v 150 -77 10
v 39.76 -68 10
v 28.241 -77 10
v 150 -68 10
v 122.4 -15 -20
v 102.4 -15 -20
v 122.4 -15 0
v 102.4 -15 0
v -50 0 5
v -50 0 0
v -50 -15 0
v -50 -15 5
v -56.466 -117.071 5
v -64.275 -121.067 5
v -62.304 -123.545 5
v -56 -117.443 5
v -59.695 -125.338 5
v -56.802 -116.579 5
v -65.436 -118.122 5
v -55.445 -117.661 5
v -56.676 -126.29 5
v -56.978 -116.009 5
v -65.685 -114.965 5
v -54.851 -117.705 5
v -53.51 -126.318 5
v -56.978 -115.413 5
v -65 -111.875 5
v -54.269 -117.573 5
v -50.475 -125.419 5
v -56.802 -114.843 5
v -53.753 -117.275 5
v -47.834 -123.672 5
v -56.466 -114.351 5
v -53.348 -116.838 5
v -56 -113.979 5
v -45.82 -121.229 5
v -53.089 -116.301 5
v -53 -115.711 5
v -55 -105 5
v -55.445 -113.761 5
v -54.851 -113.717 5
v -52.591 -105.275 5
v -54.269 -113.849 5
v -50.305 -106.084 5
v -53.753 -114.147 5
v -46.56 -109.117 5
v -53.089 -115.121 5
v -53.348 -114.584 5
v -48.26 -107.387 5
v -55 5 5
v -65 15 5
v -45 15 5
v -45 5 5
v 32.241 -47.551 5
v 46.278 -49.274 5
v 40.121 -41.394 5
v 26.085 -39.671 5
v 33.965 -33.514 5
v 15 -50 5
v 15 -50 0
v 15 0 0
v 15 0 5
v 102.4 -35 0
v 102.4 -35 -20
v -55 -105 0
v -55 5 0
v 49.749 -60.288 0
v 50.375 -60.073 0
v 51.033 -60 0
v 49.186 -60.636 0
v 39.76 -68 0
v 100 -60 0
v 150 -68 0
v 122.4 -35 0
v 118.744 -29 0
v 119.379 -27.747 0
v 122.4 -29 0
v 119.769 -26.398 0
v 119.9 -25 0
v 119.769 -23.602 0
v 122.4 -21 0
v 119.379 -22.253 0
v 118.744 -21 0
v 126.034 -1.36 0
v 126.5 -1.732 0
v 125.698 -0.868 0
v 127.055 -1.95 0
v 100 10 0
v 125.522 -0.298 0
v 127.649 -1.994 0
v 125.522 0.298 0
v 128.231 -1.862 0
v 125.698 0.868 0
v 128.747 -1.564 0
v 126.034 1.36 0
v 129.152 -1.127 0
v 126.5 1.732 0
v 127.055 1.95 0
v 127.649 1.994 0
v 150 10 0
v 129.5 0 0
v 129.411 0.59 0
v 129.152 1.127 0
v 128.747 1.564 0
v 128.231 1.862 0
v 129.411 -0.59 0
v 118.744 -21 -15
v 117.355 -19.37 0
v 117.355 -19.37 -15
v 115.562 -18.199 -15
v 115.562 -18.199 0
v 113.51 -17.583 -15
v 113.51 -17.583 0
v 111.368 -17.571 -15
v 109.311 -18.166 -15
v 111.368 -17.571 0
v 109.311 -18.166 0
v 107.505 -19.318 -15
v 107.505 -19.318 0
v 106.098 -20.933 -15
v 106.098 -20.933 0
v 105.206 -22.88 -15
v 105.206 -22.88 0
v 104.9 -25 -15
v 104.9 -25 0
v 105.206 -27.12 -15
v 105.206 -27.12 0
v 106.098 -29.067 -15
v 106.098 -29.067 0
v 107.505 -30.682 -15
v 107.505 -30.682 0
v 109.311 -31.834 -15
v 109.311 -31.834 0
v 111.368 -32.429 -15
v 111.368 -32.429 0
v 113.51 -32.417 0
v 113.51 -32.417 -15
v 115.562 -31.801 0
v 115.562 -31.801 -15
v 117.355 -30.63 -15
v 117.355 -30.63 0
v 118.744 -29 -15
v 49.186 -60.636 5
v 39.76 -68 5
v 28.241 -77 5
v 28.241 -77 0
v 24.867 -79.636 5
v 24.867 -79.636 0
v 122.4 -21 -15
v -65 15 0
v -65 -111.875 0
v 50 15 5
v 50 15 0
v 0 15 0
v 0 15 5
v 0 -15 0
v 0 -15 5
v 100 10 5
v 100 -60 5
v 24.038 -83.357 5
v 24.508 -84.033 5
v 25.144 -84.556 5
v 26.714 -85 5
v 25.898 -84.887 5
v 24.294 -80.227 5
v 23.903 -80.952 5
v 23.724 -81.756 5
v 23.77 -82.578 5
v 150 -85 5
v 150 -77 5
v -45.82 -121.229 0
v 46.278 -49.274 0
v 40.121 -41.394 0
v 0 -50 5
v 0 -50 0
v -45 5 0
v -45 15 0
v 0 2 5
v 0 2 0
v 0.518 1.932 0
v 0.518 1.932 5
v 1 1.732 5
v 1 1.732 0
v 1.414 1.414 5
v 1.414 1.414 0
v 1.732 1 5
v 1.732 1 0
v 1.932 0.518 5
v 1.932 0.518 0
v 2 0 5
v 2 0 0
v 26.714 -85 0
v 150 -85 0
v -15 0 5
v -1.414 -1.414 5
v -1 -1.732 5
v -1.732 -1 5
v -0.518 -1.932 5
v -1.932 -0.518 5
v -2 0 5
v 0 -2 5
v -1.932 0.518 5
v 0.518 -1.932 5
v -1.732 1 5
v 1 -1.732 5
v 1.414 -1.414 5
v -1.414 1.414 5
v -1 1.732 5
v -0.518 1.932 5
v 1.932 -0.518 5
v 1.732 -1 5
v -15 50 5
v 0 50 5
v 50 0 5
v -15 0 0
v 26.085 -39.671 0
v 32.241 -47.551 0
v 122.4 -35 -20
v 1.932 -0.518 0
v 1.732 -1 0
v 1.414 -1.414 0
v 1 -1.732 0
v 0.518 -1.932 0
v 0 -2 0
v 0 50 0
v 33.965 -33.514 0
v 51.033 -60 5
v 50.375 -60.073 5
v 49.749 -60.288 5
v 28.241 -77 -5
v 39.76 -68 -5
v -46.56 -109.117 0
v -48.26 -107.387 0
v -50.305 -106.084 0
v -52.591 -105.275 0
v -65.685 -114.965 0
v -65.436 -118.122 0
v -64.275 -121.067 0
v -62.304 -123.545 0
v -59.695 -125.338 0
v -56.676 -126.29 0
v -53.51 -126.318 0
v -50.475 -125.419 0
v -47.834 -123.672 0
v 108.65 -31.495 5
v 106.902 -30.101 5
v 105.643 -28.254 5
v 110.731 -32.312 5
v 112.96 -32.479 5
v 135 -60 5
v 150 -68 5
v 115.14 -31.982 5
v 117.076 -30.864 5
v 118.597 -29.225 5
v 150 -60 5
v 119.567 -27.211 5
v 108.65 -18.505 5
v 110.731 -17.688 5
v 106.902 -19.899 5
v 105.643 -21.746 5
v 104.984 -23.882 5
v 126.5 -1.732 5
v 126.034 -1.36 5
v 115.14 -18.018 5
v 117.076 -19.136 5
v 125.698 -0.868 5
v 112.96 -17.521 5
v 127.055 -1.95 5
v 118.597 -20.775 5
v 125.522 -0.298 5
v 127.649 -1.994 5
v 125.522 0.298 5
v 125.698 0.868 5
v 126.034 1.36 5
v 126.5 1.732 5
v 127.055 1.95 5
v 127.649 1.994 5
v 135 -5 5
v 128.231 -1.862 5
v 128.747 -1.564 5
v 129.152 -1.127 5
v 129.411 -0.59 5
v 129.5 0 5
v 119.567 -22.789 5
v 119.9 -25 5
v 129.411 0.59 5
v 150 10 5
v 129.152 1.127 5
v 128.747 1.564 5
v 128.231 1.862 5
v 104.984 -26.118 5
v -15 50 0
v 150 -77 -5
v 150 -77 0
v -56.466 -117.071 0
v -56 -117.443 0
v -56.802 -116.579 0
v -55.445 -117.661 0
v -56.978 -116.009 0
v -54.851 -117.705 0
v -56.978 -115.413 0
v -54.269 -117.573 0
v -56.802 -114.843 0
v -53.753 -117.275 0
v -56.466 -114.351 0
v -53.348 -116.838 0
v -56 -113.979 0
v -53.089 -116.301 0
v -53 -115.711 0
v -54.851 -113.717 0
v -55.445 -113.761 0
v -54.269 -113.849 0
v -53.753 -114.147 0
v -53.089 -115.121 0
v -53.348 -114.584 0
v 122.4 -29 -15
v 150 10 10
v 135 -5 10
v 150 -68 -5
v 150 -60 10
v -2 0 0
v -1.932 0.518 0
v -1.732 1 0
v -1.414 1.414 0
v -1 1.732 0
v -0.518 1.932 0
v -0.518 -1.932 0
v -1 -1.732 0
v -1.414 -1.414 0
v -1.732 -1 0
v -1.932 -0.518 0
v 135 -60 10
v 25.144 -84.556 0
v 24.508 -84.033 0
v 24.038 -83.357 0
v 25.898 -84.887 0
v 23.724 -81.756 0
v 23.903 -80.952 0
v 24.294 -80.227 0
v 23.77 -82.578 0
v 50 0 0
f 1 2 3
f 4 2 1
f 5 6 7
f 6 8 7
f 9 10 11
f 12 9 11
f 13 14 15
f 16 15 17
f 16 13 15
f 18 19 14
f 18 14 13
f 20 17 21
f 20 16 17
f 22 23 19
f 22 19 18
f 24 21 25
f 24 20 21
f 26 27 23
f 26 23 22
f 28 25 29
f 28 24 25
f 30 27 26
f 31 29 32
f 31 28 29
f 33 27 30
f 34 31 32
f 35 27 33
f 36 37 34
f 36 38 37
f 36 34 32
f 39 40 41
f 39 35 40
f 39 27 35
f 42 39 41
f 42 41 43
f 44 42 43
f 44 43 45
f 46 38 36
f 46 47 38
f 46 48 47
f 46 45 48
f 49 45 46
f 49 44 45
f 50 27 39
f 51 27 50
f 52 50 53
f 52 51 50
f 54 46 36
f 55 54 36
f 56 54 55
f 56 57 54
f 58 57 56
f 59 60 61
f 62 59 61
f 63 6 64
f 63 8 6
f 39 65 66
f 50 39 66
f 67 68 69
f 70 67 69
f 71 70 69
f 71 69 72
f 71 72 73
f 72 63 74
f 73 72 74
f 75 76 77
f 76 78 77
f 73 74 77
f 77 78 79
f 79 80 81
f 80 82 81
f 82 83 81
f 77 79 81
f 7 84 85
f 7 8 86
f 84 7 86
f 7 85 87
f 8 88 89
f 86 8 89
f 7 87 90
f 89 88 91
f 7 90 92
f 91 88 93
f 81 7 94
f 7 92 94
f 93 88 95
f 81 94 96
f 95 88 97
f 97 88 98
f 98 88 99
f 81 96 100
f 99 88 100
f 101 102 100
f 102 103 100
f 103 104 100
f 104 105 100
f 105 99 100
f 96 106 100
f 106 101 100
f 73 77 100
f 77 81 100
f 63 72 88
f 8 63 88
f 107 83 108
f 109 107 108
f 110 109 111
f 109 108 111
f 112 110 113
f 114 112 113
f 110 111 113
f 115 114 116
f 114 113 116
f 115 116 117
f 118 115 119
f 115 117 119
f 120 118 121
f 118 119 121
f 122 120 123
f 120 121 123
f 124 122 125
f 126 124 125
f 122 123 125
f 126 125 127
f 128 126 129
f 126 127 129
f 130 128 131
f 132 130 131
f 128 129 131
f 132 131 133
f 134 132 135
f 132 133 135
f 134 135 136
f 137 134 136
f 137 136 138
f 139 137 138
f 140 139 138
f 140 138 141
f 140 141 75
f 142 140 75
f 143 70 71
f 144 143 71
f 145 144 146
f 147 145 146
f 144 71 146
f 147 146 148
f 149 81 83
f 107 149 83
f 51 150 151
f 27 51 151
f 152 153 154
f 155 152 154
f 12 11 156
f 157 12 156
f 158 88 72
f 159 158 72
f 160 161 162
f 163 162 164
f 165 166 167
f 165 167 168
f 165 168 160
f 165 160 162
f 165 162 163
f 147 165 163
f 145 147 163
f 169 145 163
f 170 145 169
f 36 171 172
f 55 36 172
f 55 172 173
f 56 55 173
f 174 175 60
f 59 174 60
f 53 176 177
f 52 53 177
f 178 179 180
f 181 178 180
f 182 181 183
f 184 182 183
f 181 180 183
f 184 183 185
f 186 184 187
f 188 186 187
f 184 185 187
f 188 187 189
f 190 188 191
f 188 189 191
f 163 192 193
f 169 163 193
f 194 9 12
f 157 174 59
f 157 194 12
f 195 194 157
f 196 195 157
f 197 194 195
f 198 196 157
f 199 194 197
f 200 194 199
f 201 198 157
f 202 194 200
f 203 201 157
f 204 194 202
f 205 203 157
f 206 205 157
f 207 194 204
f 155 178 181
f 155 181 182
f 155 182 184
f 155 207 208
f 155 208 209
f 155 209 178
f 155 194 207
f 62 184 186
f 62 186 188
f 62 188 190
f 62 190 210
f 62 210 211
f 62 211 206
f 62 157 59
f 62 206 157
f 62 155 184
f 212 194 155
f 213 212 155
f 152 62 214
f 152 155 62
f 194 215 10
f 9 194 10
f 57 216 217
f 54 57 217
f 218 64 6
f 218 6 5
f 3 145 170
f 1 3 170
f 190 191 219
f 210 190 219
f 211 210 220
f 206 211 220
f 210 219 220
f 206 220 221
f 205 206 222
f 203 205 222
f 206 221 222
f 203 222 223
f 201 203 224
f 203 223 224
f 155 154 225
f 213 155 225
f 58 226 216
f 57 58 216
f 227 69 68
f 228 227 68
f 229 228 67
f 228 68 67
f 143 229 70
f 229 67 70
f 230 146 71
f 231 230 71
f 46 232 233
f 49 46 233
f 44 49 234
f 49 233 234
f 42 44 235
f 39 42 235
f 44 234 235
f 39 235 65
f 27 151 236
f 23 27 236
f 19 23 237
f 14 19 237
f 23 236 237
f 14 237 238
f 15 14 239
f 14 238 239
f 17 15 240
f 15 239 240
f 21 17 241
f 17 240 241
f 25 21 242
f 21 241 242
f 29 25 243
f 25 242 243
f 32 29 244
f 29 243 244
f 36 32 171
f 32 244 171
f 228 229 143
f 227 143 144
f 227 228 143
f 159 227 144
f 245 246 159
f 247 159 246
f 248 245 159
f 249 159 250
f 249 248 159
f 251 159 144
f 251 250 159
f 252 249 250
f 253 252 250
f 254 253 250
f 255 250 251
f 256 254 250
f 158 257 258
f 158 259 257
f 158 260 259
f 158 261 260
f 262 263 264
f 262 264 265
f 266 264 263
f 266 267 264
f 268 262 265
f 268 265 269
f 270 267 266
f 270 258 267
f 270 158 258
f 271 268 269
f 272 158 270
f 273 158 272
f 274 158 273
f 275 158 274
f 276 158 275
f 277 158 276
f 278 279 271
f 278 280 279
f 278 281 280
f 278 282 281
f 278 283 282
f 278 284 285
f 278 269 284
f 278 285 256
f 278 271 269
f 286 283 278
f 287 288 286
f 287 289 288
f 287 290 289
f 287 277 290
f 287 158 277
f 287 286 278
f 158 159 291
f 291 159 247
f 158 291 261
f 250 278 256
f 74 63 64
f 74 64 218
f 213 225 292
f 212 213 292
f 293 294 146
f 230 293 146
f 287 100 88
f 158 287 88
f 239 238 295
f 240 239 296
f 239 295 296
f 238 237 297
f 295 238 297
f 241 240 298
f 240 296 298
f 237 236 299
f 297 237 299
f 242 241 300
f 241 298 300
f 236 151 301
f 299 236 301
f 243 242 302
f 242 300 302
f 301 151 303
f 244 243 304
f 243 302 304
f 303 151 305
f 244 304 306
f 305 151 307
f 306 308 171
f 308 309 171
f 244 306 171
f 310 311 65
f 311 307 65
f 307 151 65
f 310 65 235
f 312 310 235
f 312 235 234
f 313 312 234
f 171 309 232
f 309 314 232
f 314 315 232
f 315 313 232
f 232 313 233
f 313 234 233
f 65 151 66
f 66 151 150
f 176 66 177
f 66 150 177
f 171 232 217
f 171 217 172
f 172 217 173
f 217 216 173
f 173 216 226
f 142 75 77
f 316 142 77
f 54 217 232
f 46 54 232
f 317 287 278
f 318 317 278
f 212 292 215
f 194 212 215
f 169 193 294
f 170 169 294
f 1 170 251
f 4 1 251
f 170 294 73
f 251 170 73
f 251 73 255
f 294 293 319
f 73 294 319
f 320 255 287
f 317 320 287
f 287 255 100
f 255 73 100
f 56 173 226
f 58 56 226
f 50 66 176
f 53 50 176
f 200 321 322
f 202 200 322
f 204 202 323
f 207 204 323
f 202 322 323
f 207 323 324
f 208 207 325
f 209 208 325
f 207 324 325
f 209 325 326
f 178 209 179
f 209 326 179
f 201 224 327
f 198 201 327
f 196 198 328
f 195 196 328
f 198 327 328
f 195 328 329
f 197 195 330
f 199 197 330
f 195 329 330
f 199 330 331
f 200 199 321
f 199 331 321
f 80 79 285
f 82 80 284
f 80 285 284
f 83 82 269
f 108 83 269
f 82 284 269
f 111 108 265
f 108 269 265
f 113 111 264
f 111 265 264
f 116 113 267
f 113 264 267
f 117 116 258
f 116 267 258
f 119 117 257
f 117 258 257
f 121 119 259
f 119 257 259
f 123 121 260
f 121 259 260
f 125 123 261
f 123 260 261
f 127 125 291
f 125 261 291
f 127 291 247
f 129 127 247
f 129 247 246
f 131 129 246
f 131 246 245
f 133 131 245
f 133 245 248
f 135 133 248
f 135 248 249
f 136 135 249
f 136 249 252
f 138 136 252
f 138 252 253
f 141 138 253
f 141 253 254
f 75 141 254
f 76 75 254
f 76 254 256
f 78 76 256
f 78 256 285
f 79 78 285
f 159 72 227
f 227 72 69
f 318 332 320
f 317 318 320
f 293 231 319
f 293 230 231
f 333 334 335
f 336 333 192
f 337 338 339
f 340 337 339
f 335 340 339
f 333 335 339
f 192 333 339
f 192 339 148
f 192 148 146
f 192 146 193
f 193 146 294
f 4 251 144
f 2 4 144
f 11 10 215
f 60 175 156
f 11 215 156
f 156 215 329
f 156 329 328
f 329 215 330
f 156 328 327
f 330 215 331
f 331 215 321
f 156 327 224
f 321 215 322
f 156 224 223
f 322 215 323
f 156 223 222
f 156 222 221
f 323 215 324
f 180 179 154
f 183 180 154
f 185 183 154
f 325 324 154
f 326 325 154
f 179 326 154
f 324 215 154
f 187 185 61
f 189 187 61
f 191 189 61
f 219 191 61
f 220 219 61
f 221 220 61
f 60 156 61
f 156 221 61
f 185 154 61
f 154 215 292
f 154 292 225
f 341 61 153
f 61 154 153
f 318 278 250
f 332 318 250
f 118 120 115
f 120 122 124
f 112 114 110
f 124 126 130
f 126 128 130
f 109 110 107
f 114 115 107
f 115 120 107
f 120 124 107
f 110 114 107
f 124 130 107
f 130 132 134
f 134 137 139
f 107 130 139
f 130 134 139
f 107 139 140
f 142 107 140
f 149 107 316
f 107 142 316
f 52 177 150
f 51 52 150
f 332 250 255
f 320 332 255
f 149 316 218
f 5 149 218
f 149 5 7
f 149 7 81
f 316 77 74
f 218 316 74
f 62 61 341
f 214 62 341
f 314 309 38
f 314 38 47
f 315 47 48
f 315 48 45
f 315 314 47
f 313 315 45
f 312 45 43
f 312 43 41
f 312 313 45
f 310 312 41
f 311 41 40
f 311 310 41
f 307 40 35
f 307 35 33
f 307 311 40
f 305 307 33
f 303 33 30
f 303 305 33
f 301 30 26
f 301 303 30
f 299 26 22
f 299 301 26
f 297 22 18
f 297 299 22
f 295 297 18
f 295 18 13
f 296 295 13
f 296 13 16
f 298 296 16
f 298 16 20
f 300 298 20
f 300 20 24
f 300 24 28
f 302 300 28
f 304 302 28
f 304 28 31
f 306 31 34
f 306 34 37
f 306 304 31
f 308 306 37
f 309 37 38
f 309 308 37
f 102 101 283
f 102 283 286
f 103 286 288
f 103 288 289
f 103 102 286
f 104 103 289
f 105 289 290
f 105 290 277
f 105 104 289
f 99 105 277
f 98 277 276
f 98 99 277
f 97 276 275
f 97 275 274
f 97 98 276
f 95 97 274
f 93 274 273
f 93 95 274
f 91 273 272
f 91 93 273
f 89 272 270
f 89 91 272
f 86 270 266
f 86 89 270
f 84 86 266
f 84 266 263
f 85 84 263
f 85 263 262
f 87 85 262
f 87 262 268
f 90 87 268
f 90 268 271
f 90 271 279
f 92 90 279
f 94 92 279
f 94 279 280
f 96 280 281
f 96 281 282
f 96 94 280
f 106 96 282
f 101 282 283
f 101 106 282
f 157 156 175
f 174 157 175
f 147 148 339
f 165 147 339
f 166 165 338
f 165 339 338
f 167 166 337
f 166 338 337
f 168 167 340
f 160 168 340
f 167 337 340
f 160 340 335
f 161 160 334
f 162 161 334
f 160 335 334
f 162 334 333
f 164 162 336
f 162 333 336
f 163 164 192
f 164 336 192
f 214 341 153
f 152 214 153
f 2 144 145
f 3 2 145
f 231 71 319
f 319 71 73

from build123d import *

# Parameters (mm, degrees)
F1_DEPTH  = 5
F3_R      = 2
F4_DEPTH  = 5
F6_DEPTH  = 5
F7_R      = 7.5
F8_DEPTH  = 5.001
F10_DEPTH = 5
F12_DEPTH = 5
F2_R      = 2
F13_DEPTH = 5
F15_DEPTH = 15
F16_W     = 20
F16_H     = 20
F17_DEPTH = 5


with BuildPart() as f1:
    # F0 (on Top) → F1 (new body)
    with BuildSketch(Plane.XY):
        with BuildLine():
            ThreePointArc((0, 2), (1.414214, 1.414214), (2, 0))
            Line((2, 0), (15, 0))
            Line((15, 0), (50, 0))
            Line((50, 0), (50, 15))
            Line((50, 15), (0, 15))
            Line((0, 15), (0, 2))
        make_face()
        with BuildLine():
            Line((15, 0), (2, 0))
            ThreePointArc((2, 0), (1.414214, -1.414214), (0, -2))
            Line((0, -2), (0, -15))
            Line((0, -15), (0, -50))
            Line((0, -50), (15, -50))
            Line((15, -50), (15, 0))
        make_face()
        with BuildLine():
            Line((0, -15), (0, -2))
            ThreePointArc((0, -2), (-1.414214, -1.414214), (-2, 0))
            Line((-2, 0), (-15, 0))
            Line((-15, 0), (-50, 0))
            Line((-50, 0), (-50, -15))
            Line((-50, -15), (0, -15))
        make_face()
        with BuildLine():
            Line((-15, 0), (-2, 0))
            ThreePointArc((-2, 0), (-1.414214, 1.414214), (0, 2))
            Line((0, 2), (0, 15))
            Line((0, 15), (0, 50))
            Line((0, 50), (-15, 50))
            Line((-15, 50), (-15, 0))
        make_face()
    extrude(amount=F1_DEPTH)


with BuildPart() as f4:
    # F3 (on Top) → F4 (new body)
    with BuildSketch(Plane.XY):
        with BuildLine():
            Line((150, 10), (100, 10))
            Line((100, 10), (100, -60))
            Line((100, -60), (51.032983, -60))
            ThreePointArc((51.032983, -60), (50.056278, -60.163444), (49.185998, -60.635968))
            Line((49.185998, -60.635968), (24.867107, -79.635968))
            ThreePointArc((24.867107, -79.635968), (23.877536, -82.976704), (26.714092, -85))
            Line((26.714092, -85), (150, -85))
            Line((150, -85), (150, 10))
        make_face()
        with Locations((127.5, 0)):
            Circle(F3_R, mode=Mode.SUBTRACT)
    extrude(amount=F4_DEPTH)

    # F5 (on face) → F6 (join)
    with BuildSketch(Plane.XY.offset(5)):
        Polygon((150, -60), (150, 10), (135, -5), (135, -60), align=None)
    extrude(amount=F6_DEPTH)

    # F7 (on face) → F8 (cut, through all)
    with BuildSketch(Plane.XY.offset(5)):
        with Locations((112.4, -25)):
            Circle(F7_R)
    extrude(amount=-F8_DEPTH, mode=Mode.SUBTRACT)

    # F9 (on face) → F10 (join)
    with BuildSketch(Plane.XY.offset(5)):
        Polygon((28.240992, -77), (150, -77), (150, -68), (39.760467, -68), align=None)
    extrude(amount=F10_DEPTH)

    # F11 (on face) → F12 (join)
    with BuildSketch(Plane(origin=(0, 0, 0), x_dir=(1, 0, 0), z_dir=(0, 0, -1))):
        Polygon((150, 68), (150, 77), (28.240992, 77), (39.760467, 68), align=None)
    extrude(amount=F12_DEPTH)

    # F14 (on face) → F15 (join)
    with BuildSketch(Plane(origin=(0, 0, 0), x_dir=(1, 0, 0), z_dir=(0, 0, -1))):
        with BuildLine():
            Line((102.4, 35), (102.4, 15))
            Line((102.4, 15), (122.4, 15))
            Line((122.4, 15), (122.4, 21))
            Line((122.4, 21), (118.744289, 21))
            ThreePointArc((118.744289, 21), (104.9, 25), (118.744289, 29))
            Line((118.744289, 29), (122.4, 29))
            Line((122.4, 29), (122.4, 35))
            Line((122.4, 35), (102.4, 35))
        make_face()
    extrude(amount=F15_DEPTH)

    # F16 (on face) → F17 (join)
    with BuildSketch(Plane(origin=(0, 0, -15), x_dir=(1, 0, 0), z_dir=(0, 0, -1))):
        with Locations((112.4, 25)):
            Rectangle(F16_W, F16_H)
    extrude(amount=F17_DEPTH)


with BuildPart() as f13:
    # F2 (on Top) → F13 (new body)
    with BuildSketch(Plane.XY):
        with BuildLine():
            Line((-55, -105.000322), (-55, 4.999678))
            Line((-55, 4.999678), (-45, 4.999678))
            Line((-45, 4.999678), (-45, 14.999678))
            Line((-45, 14.999678), (-65, 14.999678))
            Line((-65, 14.999678), (-65, -111.874514))
            ThreePointArc((-65, -111.874514), (-61.067424, -106.884619), (-55, -105.000322))
        make_face()
        with BuildLine():
            ThreePointArc((-46.55987, -109.116848), (-50.304748, -106.084306), (-55, -105.000322))
            ThreePointArc((-55, -105.000322), (-61.067424, -106.884619), (-65, -111.874514))
            ThreePointArc((-65, -111.874514), (-59.695252, -125.337694), (-45.820193, -121.229131))
            ThreePointArc((-45.820193, -121.229131), (-44.679133, -118.574273), (-44.289322, -115.711))
            ThreePointArc((-44.289322, -115.711), (-44.872855, -112.223944), (-46.55987, -109.116848))
        make_face()
        with Locations((-55, -115.711)):
            Circle(F2_R, mode=Mode.SUBTRACT)
        with BuildLine():
            Line((32.241205, -47.550701), (-46.55987, -109.116848))
            ThreePointArc((-46.55987, -109.116848), (-44.872855, -112.223944), (-44.289322, -115.711))
            ThreePointArc((-44.289322, -115.711), (-44.679133, -118.574273), (-45.820193, -121.229131))
            Line((-45.820193, -121.229131), (46.277927, -49.274193))
            Line((46.277927, -49.274193), (40.121312, -41.394086))
            Line((40.121312, -41.394086), (33.964698, -33.513978))
            Line((33.964698, -33.513978), (26.08459, -39.670593))
            Line((26.08459, -39.670593), (32.241205, -47.550701))
        make_face()
    extrude(amount=F13_DEPTH)


solid = Compound([f1.part, f4.part, f13.part])
